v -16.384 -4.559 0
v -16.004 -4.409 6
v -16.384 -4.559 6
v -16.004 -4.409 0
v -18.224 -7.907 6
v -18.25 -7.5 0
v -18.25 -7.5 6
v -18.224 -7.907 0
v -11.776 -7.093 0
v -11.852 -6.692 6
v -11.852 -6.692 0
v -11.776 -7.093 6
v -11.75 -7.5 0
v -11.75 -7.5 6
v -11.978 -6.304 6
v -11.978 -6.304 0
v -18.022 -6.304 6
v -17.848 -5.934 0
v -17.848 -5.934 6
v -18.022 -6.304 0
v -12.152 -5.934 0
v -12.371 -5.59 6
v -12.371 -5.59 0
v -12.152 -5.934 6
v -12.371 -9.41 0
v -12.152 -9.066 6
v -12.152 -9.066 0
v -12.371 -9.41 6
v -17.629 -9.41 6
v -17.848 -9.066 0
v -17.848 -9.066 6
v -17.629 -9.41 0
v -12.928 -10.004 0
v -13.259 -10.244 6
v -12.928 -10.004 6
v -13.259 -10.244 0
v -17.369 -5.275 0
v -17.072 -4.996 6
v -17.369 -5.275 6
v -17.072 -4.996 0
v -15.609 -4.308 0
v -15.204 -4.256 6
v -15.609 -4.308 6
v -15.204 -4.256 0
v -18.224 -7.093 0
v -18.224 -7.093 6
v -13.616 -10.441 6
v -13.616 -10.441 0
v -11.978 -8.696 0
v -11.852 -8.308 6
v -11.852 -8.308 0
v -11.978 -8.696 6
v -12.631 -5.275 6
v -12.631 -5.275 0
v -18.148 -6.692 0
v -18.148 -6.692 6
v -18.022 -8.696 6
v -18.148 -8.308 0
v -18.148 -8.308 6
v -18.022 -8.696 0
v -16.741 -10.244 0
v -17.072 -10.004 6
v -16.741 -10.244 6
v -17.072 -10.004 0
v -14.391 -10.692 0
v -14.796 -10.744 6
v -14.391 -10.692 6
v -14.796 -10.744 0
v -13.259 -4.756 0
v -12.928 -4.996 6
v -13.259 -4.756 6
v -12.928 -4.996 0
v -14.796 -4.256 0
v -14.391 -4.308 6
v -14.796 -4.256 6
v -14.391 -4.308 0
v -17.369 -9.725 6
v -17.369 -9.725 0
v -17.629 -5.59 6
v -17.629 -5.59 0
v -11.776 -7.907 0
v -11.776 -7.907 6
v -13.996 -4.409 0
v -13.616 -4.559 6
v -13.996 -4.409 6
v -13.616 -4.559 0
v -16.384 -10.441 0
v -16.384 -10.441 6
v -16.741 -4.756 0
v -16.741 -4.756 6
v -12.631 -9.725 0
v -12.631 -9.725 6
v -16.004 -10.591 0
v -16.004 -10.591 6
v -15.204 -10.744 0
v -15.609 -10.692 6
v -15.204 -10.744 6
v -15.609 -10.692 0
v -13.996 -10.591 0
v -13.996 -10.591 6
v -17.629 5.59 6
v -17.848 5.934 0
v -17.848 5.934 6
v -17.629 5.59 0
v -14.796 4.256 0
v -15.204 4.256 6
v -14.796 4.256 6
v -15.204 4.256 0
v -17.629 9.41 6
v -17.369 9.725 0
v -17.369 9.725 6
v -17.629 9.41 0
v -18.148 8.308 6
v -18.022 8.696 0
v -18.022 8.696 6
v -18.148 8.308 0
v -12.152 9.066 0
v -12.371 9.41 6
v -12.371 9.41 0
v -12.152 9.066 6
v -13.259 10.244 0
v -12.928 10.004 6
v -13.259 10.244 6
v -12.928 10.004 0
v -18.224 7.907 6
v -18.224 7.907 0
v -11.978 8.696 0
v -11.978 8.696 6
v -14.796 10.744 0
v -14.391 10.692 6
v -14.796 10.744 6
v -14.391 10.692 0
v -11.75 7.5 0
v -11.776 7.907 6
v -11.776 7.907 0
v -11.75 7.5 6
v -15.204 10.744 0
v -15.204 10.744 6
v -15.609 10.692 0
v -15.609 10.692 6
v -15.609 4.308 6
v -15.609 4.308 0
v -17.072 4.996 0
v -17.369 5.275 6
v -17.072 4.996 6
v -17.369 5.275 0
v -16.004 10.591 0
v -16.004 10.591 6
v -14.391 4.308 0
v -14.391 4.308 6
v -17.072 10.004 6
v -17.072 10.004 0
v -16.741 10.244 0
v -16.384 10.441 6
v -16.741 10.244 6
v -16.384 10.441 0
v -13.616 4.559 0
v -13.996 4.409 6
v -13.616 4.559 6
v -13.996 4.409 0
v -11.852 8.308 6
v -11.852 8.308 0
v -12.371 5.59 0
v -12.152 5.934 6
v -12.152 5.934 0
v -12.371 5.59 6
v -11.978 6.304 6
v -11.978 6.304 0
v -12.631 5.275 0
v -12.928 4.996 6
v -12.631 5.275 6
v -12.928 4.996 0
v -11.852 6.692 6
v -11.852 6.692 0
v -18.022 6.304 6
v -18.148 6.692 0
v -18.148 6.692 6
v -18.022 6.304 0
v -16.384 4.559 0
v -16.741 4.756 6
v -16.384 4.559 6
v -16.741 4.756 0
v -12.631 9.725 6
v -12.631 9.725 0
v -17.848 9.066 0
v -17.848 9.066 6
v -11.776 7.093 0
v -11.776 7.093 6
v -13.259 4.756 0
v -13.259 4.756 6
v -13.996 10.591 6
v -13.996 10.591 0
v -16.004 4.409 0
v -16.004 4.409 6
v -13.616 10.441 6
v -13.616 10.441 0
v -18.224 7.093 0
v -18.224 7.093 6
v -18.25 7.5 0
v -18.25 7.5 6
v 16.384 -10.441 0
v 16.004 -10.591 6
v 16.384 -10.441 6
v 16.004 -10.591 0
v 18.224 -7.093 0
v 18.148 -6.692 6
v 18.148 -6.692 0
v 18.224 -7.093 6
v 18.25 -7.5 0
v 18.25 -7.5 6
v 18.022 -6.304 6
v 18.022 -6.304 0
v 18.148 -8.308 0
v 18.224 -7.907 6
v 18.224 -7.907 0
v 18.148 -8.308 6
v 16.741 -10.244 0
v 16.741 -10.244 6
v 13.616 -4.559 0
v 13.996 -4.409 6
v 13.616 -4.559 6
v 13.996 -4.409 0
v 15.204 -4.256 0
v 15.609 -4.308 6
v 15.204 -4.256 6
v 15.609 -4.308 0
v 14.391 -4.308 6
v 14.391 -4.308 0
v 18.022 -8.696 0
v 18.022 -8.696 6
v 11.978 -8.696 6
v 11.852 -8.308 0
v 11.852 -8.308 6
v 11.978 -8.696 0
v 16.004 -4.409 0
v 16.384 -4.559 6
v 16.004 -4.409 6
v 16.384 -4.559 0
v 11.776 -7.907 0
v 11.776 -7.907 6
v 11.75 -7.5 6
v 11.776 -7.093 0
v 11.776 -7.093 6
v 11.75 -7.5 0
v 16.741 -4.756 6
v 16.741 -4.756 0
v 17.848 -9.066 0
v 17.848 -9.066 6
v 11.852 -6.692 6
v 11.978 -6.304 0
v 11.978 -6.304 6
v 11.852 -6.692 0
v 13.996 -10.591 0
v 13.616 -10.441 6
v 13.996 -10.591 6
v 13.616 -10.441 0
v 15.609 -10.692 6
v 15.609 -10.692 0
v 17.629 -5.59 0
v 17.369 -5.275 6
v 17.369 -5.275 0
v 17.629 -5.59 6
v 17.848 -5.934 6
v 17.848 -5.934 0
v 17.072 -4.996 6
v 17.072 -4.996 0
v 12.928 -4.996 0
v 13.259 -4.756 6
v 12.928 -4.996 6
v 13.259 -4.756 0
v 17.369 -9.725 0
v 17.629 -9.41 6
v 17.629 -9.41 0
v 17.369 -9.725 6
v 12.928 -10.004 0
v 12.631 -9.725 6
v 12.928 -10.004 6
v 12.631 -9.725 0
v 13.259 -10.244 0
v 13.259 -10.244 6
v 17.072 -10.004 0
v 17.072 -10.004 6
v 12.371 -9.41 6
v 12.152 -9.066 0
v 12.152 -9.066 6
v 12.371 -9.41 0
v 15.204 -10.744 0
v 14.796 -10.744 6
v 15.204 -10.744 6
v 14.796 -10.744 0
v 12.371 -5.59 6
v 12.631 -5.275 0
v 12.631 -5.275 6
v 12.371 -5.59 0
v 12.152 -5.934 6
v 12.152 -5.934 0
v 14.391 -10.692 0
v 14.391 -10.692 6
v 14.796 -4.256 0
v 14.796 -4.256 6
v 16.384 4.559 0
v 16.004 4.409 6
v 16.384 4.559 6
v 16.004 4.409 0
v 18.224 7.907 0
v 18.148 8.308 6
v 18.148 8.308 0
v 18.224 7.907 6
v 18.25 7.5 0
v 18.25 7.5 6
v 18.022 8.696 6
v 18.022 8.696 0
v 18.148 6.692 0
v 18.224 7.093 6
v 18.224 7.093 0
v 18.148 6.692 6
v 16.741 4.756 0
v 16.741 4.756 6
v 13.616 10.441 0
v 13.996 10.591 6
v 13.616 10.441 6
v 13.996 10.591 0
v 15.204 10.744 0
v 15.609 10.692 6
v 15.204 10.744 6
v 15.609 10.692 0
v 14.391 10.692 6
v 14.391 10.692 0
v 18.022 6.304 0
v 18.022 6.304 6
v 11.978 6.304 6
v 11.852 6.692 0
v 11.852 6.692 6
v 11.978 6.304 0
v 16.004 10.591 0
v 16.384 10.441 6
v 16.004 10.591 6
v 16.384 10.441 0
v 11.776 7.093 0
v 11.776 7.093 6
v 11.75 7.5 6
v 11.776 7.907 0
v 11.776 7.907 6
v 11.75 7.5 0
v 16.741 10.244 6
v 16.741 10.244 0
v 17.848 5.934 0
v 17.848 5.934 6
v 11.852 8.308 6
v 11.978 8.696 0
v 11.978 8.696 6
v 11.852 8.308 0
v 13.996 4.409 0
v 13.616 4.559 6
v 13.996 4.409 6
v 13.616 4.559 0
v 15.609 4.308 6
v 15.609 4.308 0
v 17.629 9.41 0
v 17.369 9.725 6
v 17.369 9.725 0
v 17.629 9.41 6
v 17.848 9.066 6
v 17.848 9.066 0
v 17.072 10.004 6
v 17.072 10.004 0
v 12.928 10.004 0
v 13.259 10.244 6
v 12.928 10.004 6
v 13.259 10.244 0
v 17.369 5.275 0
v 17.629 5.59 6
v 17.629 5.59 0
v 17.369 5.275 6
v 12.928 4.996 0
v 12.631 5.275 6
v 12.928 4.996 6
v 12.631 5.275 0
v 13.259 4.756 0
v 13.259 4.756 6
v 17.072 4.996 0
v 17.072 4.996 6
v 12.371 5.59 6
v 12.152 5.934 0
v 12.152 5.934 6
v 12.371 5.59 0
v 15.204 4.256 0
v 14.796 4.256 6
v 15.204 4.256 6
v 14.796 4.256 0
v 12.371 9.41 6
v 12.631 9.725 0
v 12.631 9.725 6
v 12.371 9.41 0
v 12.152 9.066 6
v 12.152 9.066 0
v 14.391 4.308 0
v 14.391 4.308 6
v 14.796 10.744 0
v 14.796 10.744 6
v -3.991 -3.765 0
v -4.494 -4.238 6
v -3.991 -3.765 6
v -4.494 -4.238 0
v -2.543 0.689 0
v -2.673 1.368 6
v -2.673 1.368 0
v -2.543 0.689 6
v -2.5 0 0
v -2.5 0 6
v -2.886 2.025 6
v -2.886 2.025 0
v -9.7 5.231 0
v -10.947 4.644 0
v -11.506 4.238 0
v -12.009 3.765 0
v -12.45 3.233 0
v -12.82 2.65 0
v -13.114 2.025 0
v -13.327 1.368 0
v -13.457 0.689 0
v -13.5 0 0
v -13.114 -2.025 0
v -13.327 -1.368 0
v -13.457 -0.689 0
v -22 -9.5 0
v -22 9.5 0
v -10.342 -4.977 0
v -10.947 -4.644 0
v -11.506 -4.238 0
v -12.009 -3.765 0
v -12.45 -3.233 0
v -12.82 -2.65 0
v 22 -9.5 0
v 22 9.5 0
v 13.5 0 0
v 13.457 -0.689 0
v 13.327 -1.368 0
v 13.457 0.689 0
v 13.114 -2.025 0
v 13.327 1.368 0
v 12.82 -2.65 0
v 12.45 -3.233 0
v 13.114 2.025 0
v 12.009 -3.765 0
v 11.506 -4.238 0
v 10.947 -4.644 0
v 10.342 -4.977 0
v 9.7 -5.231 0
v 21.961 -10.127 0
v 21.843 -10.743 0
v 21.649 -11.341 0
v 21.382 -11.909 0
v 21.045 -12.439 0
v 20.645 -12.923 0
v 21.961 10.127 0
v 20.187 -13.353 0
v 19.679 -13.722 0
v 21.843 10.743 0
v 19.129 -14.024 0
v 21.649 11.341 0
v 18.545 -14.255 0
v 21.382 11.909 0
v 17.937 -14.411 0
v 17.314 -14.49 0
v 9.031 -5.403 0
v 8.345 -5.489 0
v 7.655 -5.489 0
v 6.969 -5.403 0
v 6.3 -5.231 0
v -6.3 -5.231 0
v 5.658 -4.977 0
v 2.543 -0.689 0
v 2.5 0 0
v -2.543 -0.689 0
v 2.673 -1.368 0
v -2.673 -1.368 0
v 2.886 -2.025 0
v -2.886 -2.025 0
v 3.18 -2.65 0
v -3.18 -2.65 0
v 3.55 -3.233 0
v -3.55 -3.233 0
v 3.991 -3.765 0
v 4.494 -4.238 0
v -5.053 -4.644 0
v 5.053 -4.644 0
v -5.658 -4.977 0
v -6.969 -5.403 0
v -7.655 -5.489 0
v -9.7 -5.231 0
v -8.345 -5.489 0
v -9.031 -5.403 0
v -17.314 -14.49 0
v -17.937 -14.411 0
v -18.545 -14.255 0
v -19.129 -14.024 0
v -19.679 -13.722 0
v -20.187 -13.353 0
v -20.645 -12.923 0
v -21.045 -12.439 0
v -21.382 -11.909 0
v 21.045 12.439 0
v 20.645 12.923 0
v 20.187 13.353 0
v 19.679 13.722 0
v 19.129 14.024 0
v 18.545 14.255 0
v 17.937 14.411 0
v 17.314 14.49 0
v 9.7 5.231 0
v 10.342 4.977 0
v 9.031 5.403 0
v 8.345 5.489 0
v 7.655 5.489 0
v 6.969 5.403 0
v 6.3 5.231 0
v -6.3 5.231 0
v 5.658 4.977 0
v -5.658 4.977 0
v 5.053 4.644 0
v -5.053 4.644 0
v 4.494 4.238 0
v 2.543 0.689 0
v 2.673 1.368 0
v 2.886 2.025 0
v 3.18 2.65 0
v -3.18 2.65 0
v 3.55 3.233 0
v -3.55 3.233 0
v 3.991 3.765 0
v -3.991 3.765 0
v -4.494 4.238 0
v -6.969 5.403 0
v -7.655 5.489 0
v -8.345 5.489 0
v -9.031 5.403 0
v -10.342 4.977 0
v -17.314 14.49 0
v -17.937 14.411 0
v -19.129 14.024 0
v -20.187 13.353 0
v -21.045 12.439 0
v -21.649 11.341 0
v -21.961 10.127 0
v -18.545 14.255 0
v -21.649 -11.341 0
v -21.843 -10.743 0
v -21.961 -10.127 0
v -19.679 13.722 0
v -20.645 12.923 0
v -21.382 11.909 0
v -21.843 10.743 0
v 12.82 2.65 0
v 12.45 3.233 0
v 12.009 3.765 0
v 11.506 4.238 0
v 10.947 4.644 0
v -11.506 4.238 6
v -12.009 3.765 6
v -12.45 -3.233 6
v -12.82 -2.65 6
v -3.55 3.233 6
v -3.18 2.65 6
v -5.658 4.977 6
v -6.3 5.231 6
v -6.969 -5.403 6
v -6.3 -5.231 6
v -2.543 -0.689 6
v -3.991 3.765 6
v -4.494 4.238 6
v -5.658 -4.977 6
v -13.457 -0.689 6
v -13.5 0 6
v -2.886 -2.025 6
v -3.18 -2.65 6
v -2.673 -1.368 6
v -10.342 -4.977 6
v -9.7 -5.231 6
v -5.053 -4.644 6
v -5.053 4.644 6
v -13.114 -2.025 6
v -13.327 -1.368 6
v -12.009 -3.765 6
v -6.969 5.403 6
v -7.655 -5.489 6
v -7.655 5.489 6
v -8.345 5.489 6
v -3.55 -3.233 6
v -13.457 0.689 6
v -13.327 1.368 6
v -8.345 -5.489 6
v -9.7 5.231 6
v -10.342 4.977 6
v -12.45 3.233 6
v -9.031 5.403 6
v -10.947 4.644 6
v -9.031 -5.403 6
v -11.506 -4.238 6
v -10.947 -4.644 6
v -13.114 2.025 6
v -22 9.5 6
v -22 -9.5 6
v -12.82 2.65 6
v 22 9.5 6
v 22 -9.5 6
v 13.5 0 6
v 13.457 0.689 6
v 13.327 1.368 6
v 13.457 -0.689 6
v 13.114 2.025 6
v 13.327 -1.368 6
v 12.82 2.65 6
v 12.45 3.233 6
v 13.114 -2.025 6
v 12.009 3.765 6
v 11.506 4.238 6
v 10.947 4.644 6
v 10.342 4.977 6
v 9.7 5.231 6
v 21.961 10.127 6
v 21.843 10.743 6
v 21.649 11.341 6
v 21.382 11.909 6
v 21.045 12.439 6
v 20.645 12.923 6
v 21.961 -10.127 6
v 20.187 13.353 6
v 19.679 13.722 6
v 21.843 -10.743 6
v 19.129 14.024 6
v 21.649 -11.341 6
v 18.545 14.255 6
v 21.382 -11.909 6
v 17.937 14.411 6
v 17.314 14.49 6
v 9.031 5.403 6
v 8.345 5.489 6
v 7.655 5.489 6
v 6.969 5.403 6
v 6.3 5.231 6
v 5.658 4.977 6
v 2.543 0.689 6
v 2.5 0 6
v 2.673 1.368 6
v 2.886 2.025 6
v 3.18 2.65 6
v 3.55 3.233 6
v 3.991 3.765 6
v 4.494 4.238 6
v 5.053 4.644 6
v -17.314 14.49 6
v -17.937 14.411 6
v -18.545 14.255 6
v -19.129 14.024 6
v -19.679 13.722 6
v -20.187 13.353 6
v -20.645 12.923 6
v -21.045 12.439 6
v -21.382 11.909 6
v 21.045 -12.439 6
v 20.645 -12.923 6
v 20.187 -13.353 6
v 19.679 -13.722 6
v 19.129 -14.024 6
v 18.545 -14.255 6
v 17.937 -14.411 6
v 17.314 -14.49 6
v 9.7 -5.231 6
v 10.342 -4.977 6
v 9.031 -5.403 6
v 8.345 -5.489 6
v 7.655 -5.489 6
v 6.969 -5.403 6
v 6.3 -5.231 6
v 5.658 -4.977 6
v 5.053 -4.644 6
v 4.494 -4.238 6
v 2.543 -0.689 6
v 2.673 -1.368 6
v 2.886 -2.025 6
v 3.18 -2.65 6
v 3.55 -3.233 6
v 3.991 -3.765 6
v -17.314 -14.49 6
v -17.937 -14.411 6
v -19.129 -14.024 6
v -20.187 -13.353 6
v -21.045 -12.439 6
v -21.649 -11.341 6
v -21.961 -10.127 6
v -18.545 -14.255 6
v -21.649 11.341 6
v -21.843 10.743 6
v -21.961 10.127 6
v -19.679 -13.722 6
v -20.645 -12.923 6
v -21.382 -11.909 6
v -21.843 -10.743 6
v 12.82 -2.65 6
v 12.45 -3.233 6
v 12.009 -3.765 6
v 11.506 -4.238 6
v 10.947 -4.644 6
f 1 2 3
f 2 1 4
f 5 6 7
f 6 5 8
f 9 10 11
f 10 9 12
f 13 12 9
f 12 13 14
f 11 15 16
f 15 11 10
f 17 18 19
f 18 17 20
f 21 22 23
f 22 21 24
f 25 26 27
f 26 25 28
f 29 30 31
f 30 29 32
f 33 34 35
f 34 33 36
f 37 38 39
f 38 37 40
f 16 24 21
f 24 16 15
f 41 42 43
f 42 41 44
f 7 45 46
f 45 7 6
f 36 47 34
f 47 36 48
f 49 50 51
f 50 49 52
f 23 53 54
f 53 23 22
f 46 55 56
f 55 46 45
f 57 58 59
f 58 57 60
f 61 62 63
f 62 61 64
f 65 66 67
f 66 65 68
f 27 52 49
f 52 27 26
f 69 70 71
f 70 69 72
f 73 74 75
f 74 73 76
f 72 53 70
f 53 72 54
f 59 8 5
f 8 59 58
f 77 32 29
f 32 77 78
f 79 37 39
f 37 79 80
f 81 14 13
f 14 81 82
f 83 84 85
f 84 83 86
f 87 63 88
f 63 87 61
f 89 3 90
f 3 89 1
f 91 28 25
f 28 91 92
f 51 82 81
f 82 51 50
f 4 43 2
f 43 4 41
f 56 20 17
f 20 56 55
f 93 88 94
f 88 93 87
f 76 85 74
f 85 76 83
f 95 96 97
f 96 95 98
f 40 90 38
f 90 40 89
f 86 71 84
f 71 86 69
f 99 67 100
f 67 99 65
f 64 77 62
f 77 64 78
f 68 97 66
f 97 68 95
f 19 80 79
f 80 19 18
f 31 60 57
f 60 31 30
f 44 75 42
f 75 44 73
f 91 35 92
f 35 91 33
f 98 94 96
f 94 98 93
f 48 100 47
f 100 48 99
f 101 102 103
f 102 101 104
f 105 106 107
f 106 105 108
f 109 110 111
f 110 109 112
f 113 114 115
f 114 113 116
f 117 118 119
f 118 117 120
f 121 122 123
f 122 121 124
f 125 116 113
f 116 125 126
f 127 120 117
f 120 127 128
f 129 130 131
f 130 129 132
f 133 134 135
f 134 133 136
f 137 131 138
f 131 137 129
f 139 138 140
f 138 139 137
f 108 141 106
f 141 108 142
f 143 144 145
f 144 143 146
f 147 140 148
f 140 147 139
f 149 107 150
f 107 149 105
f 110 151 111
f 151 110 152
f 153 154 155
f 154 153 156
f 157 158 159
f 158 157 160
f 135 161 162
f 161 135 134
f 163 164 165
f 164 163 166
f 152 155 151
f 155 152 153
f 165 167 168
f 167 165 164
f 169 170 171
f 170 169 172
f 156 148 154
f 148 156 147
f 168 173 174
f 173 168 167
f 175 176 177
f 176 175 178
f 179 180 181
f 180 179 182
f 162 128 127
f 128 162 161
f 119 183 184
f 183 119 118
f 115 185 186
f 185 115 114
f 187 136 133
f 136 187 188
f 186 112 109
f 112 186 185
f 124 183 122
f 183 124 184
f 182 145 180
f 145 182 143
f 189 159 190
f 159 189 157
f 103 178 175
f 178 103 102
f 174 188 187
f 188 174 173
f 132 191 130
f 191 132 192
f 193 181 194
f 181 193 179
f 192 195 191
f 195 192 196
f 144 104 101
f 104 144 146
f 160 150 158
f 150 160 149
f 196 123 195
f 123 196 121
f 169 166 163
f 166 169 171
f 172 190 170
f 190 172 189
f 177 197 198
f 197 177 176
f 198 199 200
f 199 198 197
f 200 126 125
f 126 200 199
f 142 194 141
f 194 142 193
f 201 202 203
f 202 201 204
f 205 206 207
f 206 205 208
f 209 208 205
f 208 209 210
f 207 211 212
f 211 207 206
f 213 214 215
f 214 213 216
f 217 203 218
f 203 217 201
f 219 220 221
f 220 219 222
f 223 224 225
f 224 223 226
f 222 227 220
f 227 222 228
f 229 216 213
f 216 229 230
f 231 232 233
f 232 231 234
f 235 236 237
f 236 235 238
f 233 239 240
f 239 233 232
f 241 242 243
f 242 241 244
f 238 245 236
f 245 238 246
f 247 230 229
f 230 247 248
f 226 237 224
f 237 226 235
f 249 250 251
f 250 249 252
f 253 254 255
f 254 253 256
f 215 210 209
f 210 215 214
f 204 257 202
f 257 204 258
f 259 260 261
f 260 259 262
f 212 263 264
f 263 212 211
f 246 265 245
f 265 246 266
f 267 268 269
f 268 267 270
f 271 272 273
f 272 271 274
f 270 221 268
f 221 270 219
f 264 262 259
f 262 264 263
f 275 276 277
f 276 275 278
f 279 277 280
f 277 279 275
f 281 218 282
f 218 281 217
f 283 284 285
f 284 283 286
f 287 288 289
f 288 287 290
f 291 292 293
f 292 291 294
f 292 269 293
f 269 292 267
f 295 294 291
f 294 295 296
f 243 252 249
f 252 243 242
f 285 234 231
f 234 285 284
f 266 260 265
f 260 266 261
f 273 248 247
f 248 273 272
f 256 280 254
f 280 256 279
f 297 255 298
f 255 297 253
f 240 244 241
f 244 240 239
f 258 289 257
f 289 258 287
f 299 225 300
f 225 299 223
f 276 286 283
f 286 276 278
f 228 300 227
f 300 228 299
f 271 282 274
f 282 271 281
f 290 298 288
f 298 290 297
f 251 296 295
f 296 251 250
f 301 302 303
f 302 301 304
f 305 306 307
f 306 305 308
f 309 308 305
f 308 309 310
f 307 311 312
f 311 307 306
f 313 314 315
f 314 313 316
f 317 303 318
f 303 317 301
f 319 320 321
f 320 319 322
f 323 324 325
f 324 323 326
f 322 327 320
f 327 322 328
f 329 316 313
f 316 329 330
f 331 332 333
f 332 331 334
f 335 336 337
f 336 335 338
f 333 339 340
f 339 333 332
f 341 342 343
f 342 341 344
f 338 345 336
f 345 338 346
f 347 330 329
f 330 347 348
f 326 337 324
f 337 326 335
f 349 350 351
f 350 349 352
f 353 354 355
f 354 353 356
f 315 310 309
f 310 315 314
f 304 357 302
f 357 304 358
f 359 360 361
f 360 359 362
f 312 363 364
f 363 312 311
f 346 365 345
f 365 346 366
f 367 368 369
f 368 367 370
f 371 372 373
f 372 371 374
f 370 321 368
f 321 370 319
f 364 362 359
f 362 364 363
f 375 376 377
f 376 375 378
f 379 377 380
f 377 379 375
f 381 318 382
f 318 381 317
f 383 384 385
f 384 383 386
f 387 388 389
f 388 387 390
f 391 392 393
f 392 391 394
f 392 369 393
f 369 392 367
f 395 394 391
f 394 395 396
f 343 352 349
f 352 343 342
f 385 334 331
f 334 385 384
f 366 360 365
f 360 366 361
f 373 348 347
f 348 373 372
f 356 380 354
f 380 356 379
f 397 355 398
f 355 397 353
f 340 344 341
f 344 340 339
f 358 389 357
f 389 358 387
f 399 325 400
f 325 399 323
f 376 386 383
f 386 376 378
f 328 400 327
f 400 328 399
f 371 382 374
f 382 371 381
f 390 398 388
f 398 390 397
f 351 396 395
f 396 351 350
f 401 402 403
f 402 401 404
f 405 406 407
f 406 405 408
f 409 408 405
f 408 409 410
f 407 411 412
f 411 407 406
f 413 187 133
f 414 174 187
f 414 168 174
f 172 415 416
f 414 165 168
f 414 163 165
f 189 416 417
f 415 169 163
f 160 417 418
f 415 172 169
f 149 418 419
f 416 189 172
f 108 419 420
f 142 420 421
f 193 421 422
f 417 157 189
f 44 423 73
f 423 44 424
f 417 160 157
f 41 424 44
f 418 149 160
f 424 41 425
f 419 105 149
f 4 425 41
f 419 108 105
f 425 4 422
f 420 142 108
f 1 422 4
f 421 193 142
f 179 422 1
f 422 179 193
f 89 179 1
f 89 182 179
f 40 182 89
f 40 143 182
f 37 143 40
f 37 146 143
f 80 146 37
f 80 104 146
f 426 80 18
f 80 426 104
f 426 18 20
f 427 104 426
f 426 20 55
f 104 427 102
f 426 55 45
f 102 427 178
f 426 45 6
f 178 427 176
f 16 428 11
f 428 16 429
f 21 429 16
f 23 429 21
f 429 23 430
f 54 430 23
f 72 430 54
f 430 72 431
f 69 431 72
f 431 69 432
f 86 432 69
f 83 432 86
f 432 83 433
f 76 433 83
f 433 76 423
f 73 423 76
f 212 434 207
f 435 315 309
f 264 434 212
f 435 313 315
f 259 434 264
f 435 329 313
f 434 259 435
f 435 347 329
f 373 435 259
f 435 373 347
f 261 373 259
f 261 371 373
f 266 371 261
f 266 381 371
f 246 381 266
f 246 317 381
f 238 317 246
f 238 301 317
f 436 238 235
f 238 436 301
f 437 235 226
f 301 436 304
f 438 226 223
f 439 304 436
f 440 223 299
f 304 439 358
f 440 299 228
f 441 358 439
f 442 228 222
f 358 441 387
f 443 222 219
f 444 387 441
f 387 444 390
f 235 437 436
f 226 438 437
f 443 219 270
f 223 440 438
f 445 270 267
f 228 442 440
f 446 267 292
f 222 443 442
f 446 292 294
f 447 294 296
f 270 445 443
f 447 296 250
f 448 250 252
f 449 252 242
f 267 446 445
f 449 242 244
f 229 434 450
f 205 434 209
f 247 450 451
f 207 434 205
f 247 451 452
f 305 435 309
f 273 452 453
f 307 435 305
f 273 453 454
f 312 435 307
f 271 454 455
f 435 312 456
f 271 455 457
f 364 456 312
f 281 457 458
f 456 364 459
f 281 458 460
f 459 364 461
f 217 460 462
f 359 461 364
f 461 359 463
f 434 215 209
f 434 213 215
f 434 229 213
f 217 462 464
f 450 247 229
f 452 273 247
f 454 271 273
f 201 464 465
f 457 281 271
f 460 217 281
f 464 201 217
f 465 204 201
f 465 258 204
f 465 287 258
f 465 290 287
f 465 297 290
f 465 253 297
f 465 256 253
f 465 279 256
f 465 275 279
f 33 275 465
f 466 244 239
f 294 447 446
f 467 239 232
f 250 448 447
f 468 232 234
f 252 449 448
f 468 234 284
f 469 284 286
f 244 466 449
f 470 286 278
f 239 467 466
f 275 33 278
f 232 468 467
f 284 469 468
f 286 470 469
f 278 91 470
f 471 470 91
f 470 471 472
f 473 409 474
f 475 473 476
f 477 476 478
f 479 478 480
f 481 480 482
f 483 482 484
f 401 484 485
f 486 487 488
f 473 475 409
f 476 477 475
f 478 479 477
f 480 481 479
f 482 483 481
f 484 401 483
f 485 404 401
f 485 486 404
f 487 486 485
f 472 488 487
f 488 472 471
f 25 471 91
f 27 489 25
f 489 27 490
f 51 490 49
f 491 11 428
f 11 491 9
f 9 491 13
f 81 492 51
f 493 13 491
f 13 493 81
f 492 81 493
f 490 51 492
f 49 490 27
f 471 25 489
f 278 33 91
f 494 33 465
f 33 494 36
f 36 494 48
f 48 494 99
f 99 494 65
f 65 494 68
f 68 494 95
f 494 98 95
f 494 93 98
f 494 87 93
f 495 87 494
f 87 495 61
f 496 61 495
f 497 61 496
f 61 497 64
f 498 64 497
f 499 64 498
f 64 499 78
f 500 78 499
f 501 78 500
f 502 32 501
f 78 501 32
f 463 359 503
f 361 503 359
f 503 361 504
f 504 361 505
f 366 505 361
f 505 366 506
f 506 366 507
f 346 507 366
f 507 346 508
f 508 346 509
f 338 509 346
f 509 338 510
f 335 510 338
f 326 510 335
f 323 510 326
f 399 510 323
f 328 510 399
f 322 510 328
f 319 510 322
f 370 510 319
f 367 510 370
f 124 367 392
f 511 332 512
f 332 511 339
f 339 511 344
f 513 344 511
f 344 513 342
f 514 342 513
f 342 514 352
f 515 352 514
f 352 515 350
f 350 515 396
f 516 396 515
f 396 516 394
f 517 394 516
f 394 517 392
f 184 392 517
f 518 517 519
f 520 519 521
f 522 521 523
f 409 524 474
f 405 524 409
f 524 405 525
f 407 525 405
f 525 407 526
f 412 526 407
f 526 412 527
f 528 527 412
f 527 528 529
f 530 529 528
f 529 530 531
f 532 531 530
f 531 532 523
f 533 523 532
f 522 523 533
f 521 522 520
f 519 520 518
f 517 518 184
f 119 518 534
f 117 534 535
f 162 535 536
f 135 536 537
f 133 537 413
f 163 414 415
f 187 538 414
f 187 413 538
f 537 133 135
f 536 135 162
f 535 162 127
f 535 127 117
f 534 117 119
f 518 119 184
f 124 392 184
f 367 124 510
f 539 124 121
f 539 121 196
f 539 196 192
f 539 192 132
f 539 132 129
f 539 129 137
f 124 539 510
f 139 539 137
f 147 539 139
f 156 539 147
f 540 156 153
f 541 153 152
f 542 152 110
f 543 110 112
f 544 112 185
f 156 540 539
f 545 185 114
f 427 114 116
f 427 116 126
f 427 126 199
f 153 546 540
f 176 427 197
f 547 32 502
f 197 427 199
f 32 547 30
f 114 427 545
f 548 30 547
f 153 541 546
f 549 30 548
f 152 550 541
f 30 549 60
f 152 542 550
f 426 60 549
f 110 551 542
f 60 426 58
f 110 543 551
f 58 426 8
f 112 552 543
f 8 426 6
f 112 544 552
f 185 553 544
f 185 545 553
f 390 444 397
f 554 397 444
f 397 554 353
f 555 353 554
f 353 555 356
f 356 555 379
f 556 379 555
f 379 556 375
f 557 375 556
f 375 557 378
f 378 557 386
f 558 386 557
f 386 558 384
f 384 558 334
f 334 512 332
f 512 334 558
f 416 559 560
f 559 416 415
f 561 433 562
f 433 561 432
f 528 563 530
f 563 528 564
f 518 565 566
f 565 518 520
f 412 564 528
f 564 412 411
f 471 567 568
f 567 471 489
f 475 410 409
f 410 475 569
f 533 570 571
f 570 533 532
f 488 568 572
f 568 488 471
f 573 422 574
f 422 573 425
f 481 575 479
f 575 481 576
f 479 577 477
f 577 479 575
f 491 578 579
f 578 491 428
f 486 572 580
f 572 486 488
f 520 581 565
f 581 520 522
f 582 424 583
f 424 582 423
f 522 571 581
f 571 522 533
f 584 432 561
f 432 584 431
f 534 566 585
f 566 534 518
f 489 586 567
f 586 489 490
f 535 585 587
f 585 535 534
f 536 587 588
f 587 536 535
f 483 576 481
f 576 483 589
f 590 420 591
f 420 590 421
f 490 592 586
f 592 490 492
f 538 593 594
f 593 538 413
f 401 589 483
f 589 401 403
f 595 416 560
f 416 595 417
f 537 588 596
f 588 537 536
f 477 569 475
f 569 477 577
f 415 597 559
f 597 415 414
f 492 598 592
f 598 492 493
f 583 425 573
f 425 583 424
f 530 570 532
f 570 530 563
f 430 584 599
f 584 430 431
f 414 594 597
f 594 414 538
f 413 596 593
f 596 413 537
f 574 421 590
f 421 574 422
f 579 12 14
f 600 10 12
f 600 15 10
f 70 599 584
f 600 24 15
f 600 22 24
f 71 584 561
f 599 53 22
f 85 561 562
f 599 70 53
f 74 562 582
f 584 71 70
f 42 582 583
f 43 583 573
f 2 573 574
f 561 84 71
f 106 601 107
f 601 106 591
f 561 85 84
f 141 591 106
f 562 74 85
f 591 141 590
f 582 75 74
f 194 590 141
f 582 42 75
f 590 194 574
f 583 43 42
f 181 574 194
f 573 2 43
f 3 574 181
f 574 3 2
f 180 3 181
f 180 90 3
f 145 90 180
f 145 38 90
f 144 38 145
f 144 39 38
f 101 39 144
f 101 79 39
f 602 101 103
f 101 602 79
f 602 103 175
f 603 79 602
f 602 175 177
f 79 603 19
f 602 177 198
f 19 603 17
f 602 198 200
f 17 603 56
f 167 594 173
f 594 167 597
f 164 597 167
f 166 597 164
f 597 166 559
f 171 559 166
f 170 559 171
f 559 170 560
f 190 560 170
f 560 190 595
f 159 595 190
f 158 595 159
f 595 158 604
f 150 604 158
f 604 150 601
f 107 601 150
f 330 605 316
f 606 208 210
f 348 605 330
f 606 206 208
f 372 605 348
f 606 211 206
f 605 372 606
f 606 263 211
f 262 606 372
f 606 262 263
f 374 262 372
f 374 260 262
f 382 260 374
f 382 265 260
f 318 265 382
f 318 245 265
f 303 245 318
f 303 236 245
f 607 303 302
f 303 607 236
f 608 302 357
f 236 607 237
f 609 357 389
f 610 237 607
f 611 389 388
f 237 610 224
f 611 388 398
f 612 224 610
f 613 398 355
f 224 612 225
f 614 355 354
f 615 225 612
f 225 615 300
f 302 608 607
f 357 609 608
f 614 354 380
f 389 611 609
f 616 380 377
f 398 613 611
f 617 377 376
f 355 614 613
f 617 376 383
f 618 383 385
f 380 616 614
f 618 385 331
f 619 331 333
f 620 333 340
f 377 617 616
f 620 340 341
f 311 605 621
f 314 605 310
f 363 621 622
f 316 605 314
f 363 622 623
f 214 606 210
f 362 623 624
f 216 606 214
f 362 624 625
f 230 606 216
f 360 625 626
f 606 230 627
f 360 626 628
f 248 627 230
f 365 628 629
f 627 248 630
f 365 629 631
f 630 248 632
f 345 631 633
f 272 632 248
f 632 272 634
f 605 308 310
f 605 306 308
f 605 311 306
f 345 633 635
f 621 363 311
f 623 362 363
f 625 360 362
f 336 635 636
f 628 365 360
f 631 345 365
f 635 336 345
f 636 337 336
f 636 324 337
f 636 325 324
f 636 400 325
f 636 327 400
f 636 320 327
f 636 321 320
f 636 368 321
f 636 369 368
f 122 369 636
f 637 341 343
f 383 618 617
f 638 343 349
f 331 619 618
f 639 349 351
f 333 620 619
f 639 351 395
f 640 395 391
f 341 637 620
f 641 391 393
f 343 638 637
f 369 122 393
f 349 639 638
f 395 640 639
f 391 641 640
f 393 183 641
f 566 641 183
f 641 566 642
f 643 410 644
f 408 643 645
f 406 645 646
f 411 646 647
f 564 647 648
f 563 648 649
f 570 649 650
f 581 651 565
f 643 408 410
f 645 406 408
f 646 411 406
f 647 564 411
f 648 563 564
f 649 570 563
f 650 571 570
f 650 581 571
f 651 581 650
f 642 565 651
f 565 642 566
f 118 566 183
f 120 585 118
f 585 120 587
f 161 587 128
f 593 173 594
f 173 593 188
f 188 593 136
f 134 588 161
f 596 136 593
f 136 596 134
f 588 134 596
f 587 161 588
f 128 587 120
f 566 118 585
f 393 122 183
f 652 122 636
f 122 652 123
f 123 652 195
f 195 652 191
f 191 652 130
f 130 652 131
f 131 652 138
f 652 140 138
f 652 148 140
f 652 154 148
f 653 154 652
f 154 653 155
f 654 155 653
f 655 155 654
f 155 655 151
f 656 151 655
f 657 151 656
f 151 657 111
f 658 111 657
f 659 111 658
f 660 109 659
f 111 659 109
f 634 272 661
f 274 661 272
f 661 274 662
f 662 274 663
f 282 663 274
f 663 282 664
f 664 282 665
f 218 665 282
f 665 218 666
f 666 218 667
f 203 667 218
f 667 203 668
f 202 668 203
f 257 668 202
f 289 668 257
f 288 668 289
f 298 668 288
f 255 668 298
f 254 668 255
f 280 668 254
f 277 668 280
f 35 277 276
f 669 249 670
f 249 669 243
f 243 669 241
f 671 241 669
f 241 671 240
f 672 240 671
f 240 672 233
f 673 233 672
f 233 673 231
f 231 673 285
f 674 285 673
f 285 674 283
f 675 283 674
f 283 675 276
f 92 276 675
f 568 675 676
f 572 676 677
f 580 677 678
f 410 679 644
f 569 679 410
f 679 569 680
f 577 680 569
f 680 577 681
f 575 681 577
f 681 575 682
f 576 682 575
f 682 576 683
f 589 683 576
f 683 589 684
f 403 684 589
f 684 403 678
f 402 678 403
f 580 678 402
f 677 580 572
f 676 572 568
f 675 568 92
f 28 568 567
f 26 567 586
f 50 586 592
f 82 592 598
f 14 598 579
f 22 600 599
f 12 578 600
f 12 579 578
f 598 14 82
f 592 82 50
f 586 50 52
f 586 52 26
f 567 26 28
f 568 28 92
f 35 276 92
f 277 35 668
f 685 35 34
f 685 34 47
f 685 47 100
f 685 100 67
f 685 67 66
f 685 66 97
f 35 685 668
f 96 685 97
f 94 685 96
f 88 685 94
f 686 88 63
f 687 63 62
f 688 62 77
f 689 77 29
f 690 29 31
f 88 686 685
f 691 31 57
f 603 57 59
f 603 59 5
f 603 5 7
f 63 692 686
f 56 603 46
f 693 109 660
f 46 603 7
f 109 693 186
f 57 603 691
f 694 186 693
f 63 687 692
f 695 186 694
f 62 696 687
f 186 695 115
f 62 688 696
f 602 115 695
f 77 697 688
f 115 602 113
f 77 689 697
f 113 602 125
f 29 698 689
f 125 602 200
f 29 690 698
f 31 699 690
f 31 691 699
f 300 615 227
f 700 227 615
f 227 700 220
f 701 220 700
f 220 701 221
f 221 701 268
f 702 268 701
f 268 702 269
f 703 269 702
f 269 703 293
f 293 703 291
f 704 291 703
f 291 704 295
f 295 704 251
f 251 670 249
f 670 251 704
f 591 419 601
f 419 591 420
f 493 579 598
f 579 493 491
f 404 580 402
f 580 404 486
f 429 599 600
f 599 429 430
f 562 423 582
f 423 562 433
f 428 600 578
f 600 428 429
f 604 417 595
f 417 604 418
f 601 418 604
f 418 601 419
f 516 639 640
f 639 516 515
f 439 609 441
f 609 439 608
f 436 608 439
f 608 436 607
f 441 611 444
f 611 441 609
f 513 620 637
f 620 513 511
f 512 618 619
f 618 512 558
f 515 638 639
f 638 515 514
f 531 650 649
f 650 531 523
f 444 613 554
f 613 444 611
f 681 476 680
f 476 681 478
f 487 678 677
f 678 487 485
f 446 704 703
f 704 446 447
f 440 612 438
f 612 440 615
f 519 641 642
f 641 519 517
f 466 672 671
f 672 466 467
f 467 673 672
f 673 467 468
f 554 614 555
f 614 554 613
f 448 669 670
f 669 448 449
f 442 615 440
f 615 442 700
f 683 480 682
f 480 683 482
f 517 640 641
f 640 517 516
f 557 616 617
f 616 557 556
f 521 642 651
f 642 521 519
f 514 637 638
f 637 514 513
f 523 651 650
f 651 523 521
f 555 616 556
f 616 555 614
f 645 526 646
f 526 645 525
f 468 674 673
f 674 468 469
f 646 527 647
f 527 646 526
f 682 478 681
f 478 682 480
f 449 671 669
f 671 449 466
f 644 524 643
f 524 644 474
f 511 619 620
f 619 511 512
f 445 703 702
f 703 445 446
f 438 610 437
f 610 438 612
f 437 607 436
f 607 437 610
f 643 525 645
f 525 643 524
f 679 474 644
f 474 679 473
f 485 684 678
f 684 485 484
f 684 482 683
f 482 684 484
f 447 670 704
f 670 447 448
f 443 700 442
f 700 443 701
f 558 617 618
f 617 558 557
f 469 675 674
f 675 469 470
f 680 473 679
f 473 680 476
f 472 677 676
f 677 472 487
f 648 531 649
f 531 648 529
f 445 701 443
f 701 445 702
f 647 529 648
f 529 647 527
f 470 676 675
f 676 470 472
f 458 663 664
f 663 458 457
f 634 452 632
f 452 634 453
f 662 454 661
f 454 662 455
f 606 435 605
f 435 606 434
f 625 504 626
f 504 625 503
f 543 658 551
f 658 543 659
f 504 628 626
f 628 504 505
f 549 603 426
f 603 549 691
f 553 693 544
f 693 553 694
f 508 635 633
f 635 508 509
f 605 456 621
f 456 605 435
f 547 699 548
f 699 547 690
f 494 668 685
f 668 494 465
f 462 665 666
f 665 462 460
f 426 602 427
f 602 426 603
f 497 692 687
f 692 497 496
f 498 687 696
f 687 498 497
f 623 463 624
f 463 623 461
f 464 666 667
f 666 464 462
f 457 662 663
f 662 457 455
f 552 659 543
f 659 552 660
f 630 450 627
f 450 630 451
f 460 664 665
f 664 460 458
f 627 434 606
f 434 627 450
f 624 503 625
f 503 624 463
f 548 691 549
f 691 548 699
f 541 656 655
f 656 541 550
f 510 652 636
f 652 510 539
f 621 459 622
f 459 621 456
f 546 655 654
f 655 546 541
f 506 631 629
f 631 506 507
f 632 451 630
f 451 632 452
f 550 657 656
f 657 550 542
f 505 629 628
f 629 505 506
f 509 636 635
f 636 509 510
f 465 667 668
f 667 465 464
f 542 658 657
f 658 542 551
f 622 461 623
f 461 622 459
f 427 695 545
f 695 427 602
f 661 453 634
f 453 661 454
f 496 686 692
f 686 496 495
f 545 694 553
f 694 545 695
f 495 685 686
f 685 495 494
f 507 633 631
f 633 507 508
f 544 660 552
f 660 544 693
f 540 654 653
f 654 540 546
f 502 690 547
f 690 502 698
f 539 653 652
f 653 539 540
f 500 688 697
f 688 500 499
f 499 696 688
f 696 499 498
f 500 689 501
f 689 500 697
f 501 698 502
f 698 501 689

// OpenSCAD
$fn = 50;


difference() {
	union() {
		hull() {
			translate(v = [-17.0000000000, 9.5000000000, 0]) {
				cylinder(h = 6, r = 5);
			}
			translate(v = [17.0000000000, 9.5000000000, 0]) {
				cylinder(h = 6, r = 5);
			}
			translate(v = [-17.0000000000, -9.5000000000, 0]) {
				cylinder(h = 6, r = 5);
			}
			translate(v = [17.0000000000, -9.5000000000, 0]) {
				cylinder(h = 6, r = 5);
			}
		}
	}
	union() {
		#translate(v = [-15.0000000000, -7.5000000000, -100.0000000000]) {
			cylinder(h = 200, r = 3.2500000000);
		}
		#translate(v = [-15.0000000000, 7.5000000000, -100.0000000000]) {
			cylinder(h = 200, r = 3.2500000000);
		}
		#translate(v = [15.0000000000, -7.5000000000, -100.0000000000]) {
			cylinder(h = 200, r = 3.2500000000);
		}
		#translate(v = [15.0000000000, 7.5000000000, -100.0000000000]) {
			cylinder(h = 200, r = 3.2500000000);
		}
		#translate(v = [-8.0000000000, 0, 0]) {
			cylinder(h = 6, r = 5.5000000000);
		}
		#translate(v = [8.0000000000, 0, 0]) {
			cylinder(h = 6, r = 5.5000000000);
		}
	}
}
